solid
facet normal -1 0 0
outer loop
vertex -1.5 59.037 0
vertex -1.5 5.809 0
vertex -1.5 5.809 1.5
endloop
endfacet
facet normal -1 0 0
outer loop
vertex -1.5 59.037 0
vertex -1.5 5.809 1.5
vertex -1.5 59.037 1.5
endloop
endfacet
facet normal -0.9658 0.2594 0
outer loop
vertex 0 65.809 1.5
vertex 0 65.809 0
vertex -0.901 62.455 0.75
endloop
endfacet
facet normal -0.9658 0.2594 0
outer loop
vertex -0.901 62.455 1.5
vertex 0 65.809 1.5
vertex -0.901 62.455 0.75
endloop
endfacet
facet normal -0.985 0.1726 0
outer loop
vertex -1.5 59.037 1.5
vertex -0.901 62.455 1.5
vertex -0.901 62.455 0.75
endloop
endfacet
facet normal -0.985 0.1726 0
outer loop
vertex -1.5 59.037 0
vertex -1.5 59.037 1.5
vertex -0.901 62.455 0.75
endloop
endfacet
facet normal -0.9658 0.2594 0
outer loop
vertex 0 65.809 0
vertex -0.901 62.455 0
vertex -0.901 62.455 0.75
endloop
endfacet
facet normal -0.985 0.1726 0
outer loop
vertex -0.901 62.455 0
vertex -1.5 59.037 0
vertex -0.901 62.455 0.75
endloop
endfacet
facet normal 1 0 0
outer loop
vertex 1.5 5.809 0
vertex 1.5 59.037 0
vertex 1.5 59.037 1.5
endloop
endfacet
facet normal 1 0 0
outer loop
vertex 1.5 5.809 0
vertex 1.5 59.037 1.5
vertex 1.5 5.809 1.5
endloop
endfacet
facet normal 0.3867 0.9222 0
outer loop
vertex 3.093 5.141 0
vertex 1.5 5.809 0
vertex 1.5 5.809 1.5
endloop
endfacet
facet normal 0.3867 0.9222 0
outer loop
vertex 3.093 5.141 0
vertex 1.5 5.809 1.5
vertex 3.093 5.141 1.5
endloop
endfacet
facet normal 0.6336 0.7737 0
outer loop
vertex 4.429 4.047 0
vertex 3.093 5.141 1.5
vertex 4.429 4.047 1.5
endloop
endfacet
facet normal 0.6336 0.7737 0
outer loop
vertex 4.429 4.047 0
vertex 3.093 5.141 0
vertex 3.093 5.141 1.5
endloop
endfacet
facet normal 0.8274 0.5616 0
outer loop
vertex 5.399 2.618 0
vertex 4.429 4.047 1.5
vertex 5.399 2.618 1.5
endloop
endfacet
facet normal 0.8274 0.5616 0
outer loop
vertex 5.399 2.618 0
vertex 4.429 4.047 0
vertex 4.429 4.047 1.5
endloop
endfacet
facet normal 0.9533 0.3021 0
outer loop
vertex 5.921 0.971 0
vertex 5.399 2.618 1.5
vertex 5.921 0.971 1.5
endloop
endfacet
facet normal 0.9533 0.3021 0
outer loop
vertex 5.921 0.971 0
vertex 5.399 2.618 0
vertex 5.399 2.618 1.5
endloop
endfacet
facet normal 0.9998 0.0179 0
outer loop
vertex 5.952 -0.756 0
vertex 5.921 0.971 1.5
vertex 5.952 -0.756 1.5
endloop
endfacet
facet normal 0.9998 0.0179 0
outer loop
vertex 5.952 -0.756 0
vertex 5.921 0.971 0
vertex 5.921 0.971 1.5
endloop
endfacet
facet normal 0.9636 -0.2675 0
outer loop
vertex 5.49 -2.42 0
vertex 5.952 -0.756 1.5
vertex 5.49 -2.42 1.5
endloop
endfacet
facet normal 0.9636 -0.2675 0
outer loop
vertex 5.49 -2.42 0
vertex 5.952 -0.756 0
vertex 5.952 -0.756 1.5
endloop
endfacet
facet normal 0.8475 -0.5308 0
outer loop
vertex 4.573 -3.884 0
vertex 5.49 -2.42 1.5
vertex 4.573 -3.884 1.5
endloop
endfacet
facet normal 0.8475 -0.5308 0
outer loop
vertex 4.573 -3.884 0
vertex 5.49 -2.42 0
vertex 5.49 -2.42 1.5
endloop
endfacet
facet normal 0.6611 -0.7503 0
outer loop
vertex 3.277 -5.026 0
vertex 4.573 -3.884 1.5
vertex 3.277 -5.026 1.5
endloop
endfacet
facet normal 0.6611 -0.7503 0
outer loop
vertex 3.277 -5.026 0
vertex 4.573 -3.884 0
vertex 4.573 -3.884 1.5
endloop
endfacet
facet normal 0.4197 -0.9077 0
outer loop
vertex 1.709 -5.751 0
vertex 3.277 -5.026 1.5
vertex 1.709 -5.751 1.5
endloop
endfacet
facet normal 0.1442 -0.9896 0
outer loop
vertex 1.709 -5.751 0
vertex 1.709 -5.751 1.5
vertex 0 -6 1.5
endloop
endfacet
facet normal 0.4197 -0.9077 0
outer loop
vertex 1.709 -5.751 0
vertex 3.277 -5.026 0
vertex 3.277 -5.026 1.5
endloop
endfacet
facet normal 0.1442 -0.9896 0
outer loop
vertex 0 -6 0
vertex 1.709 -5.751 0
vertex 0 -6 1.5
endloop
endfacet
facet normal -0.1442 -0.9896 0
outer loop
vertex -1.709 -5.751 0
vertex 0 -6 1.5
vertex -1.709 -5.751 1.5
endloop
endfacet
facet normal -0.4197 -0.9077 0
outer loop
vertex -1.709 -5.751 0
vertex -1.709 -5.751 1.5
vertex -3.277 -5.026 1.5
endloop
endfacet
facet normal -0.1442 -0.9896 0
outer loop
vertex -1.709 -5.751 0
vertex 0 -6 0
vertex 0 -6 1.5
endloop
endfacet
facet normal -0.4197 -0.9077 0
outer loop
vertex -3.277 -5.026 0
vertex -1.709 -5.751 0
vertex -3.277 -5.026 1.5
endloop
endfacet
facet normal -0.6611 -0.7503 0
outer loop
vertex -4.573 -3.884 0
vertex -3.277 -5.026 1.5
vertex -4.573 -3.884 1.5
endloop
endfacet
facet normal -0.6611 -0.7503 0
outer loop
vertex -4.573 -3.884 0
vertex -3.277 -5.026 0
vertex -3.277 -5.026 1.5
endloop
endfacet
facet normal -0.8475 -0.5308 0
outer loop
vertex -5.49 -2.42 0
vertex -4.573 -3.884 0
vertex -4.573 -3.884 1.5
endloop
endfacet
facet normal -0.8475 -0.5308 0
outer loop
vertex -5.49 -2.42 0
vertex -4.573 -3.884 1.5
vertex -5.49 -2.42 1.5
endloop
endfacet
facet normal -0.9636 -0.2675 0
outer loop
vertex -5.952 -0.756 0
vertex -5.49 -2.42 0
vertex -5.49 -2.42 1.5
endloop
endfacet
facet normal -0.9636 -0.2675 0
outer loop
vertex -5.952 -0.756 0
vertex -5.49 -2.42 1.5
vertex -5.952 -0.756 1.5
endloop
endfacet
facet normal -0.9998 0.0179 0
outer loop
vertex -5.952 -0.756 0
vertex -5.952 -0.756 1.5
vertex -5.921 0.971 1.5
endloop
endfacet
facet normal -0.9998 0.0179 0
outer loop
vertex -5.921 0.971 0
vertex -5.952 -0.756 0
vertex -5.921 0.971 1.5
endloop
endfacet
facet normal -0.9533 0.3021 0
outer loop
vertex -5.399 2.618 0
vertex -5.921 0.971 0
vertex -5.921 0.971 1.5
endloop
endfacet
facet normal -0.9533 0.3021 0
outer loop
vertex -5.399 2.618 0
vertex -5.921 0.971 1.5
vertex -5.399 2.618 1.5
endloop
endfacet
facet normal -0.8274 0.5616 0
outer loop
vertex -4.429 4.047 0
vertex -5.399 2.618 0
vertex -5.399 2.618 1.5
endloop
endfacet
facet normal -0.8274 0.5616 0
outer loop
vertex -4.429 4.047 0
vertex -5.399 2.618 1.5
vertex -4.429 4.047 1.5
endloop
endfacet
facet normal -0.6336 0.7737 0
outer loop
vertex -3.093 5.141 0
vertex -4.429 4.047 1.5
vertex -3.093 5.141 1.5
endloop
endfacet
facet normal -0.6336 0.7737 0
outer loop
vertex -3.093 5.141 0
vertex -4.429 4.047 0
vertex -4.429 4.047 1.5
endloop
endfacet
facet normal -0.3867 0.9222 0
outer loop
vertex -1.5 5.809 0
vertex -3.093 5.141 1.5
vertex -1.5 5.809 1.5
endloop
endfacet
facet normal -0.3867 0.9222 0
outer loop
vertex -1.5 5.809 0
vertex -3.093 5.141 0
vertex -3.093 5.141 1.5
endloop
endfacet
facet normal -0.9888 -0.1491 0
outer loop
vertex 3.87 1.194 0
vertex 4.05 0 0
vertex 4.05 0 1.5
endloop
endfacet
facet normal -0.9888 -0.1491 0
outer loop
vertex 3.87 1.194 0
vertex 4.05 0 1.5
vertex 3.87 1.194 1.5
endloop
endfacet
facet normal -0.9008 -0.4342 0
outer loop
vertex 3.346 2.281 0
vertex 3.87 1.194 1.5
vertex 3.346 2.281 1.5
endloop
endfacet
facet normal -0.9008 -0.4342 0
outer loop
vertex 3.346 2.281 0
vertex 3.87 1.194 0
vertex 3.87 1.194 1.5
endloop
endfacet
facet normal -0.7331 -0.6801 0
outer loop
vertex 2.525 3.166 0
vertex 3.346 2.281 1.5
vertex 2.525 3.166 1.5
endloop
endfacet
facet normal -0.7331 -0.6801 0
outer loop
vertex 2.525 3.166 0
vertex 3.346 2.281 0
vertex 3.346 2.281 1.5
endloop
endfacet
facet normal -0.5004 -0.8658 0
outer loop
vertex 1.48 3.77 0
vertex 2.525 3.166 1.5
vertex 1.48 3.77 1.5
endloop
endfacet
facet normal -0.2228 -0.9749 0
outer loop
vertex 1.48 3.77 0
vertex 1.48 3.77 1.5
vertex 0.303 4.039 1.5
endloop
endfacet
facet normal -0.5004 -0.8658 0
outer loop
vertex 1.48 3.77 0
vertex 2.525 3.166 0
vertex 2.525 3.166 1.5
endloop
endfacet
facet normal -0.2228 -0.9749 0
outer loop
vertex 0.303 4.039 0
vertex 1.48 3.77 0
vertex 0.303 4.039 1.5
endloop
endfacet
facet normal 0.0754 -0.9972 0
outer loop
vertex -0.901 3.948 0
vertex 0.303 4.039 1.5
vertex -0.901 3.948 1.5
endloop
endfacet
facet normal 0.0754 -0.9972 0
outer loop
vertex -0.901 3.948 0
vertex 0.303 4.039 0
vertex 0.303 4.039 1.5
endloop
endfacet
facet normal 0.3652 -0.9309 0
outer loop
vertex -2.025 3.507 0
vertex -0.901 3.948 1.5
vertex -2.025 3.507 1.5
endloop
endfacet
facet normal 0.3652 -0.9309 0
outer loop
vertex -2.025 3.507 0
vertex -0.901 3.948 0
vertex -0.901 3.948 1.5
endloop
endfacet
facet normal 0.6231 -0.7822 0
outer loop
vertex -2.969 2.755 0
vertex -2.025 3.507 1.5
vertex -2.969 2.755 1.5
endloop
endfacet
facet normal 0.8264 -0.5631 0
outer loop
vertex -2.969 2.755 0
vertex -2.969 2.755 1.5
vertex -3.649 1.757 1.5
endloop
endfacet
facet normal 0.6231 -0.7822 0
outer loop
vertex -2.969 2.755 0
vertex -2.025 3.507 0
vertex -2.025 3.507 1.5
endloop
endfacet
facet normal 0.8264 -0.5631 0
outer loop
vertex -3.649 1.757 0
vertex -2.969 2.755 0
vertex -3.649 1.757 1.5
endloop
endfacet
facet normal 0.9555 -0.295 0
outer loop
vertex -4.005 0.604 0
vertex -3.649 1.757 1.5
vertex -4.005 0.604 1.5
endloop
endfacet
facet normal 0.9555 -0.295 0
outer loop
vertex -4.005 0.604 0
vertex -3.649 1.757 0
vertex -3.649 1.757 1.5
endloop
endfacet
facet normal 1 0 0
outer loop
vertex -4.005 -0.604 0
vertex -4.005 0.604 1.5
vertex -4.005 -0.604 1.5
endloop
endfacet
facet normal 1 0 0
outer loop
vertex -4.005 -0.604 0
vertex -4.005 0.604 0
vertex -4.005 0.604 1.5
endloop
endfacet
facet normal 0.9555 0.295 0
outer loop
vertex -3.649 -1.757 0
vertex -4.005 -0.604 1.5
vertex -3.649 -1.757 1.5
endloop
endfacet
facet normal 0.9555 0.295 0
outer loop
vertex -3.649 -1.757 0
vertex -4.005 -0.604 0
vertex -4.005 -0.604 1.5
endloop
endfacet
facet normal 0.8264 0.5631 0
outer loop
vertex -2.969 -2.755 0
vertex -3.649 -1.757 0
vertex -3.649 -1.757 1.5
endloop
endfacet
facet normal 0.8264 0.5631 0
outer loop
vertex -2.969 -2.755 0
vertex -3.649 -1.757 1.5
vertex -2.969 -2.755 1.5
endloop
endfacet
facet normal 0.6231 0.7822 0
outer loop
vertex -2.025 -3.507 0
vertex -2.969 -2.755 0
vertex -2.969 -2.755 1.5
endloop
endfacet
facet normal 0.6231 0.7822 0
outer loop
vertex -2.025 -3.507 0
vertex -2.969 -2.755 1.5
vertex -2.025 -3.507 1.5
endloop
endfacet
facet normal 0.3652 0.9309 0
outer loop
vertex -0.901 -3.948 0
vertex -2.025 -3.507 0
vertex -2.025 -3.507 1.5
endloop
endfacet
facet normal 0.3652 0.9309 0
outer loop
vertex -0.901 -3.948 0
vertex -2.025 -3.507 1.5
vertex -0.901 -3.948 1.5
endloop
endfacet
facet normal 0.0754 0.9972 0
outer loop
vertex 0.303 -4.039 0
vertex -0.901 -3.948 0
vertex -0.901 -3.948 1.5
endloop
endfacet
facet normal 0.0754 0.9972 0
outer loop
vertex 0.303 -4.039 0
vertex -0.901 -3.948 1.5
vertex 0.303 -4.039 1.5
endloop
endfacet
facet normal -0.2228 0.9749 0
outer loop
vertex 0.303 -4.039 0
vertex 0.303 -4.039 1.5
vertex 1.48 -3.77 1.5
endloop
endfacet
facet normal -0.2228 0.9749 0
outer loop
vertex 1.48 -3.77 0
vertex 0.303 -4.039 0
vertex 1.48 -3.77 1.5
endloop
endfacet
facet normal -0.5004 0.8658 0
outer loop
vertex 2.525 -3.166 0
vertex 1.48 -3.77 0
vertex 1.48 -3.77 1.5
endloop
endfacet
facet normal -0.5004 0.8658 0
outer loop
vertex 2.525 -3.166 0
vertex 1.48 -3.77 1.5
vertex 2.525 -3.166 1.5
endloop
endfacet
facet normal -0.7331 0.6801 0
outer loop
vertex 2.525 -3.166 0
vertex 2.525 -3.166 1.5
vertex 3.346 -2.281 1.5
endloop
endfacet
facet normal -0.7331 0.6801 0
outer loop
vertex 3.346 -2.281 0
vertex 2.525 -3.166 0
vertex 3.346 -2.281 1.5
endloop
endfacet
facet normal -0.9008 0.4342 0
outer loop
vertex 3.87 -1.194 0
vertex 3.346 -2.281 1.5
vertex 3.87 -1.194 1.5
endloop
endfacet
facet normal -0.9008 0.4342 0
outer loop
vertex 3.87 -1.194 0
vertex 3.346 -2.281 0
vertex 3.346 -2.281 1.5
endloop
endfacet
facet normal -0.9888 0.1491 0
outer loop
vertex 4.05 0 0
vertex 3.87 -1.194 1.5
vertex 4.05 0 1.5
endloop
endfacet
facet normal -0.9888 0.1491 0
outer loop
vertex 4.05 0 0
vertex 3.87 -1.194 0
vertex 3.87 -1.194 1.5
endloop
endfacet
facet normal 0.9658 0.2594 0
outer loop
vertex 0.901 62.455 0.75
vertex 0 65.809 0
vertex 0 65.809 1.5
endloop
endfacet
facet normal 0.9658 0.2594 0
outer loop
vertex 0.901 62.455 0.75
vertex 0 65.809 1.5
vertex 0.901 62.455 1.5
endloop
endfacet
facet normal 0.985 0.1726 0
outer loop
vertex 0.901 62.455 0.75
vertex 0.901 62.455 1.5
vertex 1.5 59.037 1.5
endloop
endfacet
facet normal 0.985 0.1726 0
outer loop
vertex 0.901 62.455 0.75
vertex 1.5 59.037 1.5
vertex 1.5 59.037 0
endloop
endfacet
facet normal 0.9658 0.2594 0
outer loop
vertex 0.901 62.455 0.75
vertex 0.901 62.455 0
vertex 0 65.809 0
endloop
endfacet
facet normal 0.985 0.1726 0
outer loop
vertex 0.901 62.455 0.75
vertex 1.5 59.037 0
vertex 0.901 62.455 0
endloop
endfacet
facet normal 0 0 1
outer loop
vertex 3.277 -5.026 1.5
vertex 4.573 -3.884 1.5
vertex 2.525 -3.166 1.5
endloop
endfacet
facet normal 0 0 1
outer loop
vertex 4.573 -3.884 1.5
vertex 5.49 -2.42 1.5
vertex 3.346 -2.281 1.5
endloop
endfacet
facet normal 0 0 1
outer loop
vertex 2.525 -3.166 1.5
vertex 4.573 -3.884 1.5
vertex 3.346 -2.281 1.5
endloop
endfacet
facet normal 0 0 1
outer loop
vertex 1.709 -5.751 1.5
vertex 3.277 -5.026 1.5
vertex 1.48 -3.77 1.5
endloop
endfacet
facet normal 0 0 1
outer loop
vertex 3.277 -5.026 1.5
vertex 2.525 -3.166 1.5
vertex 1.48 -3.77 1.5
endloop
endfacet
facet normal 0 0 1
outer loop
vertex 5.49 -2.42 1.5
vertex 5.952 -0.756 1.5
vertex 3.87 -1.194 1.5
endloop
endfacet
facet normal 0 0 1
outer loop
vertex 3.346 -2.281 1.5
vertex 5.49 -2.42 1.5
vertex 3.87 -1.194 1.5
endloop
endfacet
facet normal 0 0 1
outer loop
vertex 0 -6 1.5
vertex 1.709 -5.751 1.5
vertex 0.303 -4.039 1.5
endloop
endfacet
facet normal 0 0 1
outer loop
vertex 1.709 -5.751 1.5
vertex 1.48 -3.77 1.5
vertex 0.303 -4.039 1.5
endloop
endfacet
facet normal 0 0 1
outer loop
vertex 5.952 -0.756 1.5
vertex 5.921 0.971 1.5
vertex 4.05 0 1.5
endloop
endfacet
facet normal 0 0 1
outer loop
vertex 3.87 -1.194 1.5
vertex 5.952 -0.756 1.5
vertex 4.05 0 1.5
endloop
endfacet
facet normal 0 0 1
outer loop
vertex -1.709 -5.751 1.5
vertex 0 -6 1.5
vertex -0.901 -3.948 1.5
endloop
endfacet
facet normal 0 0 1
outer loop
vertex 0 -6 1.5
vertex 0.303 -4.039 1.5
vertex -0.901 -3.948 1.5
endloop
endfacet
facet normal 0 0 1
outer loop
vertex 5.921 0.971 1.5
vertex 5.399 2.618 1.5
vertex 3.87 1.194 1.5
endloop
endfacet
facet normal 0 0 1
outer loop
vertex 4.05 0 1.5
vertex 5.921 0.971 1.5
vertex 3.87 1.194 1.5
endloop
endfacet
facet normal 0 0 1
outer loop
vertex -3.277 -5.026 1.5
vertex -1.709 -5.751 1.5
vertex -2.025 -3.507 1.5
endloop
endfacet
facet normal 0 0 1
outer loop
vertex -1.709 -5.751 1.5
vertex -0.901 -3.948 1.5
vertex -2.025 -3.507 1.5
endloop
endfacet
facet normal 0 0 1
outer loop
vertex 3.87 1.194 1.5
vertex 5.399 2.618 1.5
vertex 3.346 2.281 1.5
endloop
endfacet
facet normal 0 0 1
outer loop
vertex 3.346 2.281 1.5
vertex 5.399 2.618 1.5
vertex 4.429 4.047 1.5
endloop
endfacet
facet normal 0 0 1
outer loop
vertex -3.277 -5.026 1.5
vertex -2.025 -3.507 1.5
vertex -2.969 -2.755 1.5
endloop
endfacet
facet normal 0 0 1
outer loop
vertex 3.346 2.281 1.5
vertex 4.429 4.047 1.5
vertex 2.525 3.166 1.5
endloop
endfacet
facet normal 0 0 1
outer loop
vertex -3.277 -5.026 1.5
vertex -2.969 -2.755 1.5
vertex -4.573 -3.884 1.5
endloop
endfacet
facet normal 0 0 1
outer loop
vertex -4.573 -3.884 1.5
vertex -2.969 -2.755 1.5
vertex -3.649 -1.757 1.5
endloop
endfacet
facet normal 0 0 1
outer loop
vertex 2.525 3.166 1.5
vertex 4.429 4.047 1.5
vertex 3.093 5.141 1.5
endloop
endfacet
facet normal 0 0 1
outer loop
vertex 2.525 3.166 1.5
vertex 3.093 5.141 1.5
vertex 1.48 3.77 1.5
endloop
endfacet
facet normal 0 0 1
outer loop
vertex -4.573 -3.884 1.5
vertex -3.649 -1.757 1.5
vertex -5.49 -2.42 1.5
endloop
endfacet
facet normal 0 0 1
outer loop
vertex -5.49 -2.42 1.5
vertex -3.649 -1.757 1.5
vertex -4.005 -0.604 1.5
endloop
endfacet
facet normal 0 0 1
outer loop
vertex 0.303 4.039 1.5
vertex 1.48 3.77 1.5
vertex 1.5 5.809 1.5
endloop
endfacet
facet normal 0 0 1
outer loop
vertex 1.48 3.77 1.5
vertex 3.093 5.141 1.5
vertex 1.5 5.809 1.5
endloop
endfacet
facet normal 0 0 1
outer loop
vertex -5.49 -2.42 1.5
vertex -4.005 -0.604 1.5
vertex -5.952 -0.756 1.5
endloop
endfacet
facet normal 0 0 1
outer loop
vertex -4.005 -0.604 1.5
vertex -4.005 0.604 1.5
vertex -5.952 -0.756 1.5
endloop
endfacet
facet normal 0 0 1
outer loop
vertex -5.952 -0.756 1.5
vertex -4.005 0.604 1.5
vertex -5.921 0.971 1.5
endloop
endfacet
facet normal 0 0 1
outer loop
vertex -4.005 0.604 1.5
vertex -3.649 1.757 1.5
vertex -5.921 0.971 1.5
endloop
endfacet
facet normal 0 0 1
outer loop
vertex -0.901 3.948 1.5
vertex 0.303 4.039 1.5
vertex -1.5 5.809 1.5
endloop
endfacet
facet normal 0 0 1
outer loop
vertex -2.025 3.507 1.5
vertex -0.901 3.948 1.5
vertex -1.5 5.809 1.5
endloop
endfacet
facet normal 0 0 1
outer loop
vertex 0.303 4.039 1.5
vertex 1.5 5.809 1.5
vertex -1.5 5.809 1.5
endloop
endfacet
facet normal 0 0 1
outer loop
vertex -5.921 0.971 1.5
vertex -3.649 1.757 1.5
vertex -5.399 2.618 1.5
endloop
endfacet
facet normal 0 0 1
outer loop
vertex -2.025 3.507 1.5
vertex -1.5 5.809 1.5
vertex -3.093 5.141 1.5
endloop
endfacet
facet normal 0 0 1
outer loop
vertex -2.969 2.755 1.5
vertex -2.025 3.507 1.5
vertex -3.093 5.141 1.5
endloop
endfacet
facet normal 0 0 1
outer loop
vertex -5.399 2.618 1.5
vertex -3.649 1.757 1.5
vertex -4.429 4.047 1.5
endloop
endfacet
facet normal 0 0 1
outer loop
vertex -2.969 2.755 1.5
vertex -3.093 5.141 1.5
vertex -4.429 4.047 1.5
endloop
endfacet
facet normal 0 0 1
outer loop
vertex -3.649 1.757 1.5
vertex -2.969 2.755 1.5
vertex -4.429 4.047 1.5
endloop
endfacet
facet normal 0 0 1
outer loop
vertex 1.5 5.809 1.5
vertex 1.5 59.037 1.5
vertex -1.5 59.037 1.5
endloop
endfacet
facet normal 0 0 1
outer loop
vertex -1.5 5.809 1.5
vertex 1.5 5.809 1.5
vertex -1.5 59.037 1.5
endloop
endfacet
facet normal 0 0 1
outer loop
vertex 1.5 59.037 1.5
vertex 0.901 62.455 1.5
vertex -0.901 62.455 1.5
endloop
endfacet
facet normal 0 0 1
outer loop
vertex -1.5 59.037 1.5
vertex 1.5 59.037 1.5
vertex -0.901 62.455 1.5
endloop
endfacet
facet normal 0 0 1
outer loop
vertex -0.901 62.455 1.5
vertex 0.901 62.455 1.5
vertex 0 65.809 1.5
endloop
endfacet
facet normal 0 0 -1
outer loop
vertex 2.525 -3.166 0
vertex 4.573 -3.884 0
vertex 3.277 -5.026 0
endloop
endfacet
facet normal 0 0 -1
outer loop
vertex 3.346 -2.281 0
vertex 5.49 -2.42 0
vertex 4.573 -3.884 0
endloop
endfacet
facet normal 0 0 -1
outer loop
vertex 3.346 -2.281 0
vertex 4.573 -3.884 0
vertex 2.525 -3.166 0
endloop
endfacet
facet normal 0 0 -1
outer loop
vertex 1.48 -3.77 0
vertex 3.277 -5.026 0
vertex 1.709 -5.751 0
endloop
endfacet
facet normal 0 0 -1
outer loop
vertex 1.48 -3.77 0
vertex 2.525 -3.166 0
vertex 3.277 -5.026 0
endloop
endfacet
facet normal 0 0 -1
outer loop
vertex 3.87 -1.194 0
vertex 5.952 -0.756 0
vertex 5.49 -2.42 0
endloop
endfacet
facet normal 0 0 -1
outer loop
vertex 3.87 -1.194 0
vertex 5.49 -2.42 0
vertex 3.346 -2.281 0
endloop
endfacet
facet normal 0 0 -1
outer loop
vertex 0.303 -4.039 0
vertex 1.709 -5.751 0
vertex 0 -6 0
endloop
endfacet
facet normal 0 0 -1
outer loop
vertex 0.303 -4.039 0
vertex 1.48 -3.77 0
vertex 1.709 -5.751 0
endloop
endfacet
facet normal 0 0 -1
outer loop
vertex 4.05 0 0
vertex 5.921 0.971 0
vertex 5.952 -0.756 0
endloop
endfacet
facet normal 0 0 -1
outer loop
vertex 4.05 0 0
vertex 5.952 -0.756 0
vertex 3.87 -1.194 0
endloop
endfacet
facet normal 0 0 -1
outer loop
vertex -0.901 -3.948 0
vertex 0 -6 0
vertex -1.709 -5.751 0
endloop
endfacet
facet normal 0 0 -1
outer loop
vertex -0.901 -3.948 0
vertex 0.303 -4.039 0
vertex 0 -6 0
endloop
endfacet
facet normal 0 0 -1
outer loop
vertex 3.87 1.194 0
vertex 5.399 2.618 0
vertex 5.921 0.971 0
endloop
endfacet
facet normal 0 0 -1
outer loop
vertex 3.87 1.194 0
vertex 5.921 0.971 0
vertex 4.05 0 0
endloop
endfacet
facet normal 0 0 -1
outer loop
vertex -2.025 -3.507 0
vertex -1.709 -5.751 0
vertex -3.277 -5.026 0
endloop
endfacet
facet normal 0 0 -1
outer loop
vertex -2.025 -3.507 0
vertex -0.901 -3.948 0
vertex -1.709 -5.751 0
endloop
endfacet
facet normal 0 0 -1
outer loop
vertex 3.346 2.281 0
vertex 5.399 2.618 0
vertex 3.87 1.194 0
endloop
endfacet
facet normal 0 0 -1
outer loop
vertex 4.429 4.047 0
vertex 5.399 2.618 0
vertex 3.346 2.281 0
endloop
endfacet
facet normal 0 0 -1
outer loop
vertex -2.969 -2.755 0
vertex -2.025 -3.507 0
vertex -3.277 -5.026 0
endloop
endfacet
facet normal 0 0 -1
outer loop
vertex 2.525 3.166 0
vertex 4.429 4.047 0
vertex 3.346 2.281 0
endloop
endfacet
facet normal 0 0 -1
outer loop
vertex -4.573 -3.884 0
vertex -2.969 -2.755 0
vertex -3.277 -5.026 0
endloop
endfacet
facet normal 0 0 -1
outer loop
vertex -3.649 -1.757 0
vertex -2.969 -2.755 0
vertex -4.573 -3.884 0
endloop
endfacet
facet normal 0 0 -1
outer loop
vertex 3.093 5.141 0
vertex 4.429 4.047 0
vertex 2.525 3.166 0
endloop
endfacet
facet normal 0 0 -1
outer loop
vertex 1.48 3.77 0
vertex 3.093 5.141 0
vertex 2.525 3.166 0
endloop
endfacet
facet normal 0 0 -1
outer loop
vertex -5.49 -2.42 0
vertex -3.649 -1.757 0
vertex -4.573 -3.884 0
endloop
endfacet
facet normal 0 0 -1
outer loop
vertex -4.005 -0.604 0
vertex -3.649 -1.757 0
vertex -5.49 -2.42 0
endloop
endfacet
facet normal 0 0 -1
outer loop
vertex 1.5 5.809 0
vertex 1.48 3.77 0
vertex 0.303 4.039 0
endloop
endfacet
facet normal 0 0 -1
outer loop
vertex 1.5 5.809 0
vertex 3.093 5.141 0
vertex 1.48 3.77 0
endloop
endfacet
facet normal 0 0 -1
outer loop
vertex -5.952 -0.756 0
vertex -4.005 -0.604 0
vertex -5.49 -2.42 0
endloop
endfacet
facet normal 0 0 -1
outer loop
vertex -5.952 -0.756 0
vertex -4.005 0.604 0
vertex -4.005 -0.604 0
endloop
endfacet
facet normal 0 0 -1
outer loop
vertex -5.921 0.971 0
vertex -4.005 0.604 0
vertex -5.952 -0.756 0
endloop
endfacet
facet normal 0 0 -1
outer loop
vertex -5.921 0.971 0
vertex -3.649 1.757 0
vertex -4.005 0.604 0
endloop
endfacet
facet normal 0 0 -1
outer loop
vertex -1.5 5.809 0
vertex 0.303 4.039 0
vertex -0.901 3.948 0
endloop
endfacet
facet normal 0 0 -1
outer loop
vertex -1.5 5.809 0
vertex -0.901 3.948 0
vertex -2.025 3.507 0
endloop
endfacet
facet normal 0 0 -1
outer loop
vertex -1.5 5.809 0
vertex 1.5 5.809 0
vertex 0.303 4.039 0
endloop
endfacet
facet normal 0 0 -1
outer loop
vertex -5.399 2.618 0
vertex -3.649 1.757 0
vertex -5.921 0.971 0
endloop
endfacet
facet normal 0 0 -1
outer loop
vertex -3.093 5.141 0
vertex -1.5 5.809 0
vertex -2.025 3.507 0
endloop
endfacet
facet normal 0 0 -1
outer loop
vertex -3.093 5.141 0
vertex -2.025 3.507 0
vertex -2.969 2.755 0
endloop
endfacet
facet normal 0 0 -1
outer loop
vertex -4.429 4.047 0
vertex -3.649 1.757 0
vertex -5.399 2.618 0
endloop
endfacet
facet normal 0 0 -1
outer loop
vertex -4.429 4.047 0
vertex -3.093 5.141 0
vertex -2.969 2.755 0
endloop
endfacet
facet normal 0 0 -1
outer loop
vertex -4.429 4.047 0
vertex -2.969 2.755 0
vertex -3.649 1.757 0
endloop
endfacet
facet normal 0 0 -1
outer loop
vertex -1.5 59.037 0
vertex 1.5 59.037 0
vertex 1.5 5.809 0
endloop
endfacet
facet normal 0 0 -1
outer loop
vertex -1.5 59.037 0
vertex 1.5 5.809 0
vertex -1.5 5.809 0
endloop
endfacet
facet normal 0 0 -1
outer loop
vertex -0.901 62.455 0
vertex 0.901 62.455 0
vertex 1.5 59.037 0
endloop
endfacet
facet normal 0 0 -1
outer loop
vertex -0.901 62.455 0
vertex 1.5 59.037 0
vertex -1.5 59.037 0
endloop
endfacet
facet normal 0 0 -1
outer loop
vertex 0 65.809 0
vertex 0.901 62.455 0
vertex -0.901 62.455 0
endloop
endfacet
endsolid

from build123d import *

# Parameters (mm, degrees)
SKETCH2_R           = 4.05
BOSS_EXTRUDE1_DEPTH = 1.5


with BuildPart() as part:
    # Sketch2 → Boss-Extrude1 (new body)
    with BuildSketch(Plane.XY):
        with BuildLine():
            Line((-1.5, 5.809475019), (-1.5, 59.037116847))
            add(Edge.make_bspline(
                [(0, 65.809475019), (-1.051472953, 62.487162114), (-1.5, 59.037116847)],
                knots=[0, 0, 0, 1, 1, 1], degree=2))
            add(Edge.make_bspline(
                [(0, 65.809475019), (1.051472953, 62.487162114), (1.5, 59.037116847)],
                knots=[0, 0, 0, 1, 1, 1], degree=2))
            Line((1.5, 59.037116847), (1.5, 5.809475019))
            ThreePointArc((1.5, 5.809475019), (0, -6), (-1.5, 5.809475019))
        make_face()
        Circle(SKETCH2_R, mode=Mode.SUBTRACT)
    extrude(amount=BOSS_EXTRUDE1_DEPTH)


solid = part.part
